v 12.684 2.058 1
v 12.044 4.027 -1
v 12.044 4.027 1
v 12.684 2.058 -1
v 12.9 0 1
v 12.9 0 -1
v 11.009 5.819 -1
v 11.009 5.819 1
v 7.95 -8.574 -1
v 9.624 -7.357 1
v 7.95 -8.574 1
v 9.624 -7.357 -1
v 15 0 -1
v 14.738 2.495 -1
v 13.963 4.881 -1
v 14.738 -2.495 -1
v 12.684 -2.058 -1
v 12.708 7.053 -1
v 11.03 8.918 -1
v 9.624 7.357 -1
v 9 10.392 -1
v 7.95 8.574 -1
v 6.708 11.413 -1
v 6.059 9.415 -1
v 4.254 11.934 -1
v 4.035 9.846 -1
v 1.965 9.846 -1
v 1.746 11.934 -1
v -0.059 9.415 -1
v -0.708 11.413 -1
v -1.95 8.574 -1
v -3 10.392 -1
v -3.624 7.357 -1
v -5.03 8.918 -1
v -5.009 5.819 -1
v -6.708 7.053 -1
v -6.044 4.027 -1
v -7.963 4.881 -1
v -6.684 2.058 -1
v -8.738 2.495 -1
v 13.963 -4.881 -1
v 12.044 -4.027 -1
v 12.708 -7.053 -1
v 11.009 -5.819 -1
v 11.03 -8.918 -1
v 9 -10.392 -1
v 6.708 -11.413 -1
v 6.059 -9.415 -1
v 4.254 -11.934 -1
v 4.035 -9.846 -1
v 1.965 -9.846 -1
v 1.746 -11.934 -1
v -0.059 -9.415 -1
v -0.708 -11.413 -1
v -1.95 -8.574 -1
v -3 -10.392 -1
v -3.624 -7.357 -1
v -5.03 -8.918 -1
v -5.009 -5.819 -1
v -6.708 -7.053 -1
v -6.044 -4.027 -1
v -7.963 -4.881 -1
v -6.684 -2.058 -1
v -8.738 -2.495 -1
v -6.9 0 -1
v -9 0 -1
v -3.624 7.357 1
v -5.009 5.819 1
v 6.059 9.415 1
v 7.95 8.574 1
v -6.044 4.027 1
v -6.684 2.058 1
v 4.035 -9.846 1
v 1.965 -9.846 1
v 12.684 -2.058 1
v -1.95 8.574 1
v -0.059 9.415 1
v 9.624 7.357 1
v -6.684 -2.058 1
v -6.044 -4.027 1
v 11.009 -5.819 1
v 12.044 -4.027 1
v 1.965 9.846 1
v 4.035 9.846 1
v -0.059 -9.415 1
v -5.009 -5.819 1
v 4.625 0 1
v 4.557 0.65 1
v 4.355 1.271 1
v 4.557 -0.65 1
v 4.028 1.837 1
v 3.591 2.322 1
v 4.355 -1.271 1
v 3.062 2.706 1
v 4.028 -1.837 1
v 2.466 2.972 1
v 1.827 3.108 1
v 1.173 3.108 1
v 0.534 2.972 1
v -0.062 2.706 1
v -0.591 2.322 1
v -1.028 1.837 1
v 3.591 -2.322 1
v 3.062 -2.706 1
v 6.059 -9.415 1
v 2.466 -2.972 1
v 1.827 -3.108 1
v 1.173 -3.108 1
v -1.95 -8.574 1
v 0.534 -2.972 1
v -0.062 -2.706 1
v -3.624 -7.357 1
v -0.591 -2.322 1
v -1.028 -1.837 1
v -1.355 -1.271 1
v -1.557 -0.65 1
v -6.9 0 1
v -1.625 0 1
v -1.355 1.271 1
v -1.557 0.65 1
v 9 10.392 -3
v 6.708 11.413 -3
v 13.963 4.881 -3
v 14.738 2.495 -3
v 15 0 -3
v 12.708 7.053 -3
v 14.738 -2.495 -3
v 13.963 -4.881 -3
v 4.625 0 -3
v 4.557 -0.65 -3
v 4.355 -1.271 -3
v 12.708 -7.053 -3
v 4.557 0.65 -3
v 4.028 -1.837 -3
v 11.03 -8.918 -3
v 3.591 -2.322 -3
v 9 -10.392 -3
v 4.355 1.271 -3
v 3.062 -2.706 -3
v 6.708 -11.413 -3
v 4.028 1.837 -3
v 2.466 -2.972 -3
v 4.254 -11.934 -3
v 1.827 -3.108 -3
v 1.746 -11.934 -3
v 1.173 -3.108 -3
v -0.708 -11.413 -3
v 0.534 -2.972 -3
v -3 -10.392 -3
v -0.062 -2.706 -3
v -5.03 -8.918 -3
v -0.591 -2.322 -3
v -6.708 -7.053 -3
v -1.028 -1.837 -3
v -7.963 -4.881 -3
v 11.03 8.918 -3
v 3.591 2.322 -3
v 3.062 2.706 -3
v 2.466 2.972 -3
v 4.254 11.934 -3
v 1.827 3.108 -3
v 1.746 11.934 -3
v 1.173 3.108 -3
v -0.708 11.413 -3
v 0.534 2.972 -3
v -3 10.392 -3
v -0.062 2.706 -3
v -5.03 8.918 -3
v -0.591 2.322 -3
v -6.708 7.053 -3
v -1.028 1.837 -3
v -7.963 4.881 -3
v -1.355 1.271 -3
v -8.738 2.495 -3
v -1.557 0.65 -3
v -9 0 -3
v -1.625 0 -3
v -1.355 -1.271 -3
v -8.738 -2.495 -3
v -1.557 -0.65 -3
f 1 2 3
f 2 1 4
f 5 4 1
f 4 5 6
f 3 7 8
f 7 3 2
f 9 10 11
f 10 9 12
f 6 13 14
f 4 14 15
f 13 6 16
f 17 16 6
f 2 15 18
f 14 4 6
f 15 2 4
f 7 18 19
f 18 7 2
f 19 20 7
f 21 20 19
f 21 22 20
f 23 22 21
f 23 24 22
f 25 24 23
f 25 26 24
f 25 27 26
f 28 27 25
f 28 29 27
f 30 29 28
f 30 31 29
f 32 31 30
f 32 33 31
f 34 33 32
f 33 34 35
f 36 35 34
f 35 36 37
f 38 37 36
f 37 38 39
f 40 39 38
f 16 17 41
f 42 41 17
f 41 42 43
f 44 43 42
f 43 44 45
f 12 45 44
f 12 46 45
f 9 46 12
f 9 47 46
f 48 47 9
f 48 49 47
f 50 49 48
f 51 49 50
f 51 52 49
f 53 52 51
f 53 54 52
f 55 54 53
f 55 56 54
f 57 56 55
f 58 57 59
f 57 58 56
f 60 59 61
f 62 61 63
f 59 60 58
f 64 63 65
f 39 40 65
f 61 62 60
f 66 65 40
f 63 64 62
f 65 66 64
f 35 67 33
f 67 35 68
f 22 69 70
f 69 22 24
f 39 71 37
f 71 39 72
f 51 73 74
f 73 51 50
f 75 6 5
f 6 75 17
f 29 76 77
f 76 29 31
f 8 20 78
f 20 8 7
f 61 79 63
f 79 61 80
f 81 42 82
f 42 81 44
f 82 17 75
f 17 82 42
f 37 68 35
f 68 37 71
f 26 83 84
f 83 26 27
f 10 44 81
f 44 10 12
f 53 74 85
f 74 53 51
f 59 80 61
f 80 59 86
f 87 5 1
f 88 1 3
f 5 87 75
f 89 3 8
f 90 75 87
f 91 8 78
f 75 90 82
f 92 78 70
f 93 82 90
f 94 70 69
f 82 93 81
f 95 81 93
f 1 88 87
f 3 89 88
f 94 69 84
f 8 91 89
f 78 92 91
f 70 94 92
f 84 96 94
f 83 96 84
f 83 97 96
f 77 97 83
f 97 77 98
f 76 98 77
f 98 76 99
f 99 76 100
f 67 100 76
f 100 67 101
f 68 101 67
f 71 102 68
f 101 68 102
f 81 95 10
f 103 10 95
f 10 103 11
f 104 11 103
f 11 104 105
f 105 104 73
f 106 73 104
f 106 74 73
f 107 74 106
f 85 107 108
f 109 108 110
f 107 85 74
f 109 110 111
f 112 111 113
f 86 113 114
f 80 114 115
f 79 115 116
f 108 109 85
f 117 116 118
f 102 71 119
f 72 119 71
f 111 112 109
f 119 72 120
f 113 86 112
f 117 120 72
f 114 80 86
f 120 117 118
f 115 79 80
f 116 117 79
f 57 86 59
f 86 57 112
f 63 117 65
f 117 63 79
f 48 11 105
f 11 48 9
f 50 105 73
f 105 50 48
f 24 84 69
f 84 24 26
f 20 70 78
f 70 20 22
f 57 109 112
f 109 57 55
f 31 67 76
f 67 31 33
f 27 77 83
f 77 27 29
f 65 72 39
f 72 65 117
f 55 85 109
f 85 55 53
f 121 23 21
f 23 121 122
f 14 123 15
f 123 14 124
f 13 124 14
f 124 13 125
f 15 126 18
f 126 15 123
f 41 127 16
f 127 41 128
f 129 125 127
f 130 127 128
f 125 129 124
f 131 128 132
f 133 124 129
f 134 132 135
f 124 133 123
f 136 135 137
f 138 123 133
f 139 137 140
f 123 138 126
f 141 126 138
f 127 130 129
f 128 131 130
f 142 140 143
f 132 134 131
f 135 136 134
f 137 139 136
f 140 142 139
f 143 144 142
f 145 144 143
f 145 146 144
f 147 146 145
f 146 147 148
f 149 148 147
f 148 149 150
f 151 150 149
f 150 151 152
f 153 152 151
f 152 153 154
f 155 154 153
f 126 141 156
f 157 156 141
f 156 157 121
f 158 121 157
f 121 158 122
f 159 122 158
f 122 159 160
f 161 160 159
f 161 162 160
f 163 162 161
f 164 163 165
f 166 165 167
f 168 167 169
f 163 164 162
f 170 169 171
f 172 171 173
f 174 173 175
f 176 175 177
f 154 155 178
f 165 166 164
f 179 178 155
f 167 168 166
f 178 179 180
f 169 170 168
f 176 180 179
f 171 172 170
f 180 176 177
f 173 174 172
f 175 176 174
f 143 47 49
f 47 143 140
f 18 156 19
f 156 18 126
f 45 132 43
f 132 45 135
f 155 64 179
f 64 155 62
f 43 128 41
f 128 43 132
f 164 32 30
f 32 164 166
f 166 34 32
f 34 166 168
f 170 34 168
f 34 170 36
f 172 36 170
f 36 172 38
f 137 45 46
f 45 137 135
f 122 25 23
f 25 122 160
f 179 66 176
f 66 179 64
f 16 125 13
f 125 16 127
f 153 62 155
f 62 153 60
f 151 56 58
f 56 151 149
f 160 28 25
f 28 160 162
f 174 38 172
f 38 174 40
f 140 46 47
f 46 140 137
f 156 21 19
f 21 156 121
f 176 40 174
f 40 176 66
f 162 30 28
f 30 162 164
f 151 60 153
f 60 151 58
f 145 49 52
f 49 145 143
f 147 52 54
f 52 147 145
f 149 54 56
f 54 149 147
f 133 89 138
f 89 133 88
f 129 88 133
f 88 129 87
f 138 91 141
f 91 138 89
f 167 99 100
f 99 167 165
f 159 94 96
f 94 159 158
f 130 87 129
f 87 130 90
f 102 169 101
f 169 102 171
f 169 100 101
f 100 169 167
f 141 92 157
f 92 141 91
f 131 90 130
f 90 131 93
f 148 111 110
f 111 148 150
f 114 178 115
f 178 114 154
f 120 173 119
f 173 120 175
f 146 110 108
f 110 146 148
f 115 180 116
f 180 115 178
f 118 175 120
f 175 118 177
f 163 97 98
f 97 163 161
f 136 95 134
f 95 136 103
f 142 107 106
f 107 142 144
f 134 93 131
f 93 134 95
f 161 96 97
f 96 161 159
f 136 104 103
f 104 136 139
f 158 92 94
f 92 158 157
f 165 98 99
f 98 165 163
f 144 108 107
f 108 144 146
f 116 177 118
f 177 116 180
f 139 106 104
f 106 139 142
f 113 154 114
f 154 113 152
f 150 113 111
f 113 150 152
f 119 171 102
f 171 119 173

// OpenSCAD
$fn = 30;
pi = 3.14159265;

// ===============
// These parameters are for a speed reducer with 
//
// 8 : 1 speed ratio
// 8 inner lobes
// 9 outer lobes
// 4 output cam holes

//n_inner_lobes = 8;
// lobe_diff = 1;
//thickness = 8;
//r_gen = 6;
//r_offset = 10;
//r_pins = 5;
//r_holes = r_pins + lobe_diff*r_gen;
//n_holes = 4;
//r_hole_center = 32;
//r_rotor_shaft = 16;
//r_bolts = 2;
//driven_shaft_od = 50;
//r_drive_shaft = 8;
//square_side = 10;
//alpha =  2*360*$t;

//  ==============

// ===============
// Test 

n_inner_lobes = 30;
 lobe_diff = 1;
thickness = 2;
r_gen = 6/4; //this is the eccentric offset
r_offset = 6/2; //this controls radius of cylinder in shape size
r_pins = 3/2; //the diameter of the pins that go in the holes
//r_holes = r_pins + lobe_diff*r_gen; //(this is the hole size for the pins in the middle of the gear ((currently 6, but want to expand for a bearing)
r_holes = 17.5/2; //606 bearing size to give thhe m6 hole for the pin
n_holes = 4;
r_hole_center = 60/2;

//r_rotor_shaft = 27.25/2; //inside gear 6704 bearing
r_rotor_shaft = 32.4/2; //inside gear 6804 bearing

r_bolts = 6/2;
driven_shaft_od = 40;
r_drive_shaft = 6/2;
square_side = 10;
alpha =  2*360*$t;

clearance_extra = 0.25;

//  ==============


// This part displays the REDUCTION RATIO ======
//
echo(str(n_inner_lobes/lobe_diff, " turns on the input equals 1 turn on the output."));

// This part places the INSIDE ROTOR ==========
//
translate([lobe_diff*r_gen*cos(alpha), lobe_diff* r_gen*sin(alpha), 0])
rotate([0,0,-lobe_diff*alpha/n_inner_lobes])
color([0.5, 0.5, 0.3])
//inside_rotor(n_inner_lobes, 
//				r_gen,
//				0.99*r_offset,
//				r_holes,
//				n_holes,
//				r_hole_center,
//				r_rotor_shaft,
//				thickness, clearance_extra);

// This part places the OUTSIDE ROTOR =========
//color([1, 0, 0])
//outside_rotor(n_inner_lobes + lobe_diff, 
//				r_gen,
//				r_offset,
//				r_bolts,
//				driven_shaft_od,
//				thickness, clearance_extra);

// This part places the DRIVEN SHAFT =========
//
//rotate([0,0,-lobe_diff*alpha/n_inner_lobes])
//color([0,0,1])
//driven_shaft(r_pins, n_holes, r_hole_center, thickness, driven_shaft_od, square_side) ;

// This part places the ECCENTRIC =========
//
//rotate([0,0,alpha])
eccentric(thickness, lobe_diff*r_gen, r_rotor_shaft, r_drive_shaft);

// This part places the COVER PLATE =========
//color([0.2, 0.7, 0.4, 0.6])
//translate([0,0, 1.1*thickness/2 + thickness/4])
//cover_plate(n_inner_lobes + lobe_diff, 
//				r_gen,
//				r_offset,
//				r_bolts,
//				1.02*r_drive_shaft,
//				thickness/2);




//===========================================
// Cover Plate
//
module cover_plate(	n_lobes, 
				r_gen,
				w_gen,
				r_bolts,
				r_shaft,
				thickness) {

difference() {
	cylinder(r = (n_lobes+1)*r_gen + w_gen, h = thickness, center = true);
	cylinder(r = 1.01 * r_shaft, h = 2*thickness, center = true);
	for (i=[0:n_lobes-1]) {
		rotate([0,0,360/n_lobes * (i + 0.5)])
		translate([ (n_lobes+1)*r_gen + w_gen - 4*r_bolts, 0, 0])
			cylinder(r = r_bolts, h = 2*thickness, center = true);
}

}

}
//===========================================	


//===========================================
// Driven Shaft
//
module driven_shaft(r_pins, n_pins, r_pin_center, thickness, driven_shaft_od, square_side) {
translate([0,0,-thickness])
	difference() {
	cylinder(r = driven_shaft_od, h = thickness, center = true);
	cylinder(r = 3.25, h = thickness, center = true);
	
    //cube(size=[square_side, square_side, 1.1*thickness], center = true);
	

//shaft_length = 2;
//translate([0,0, -shaft_length/2 -3*thickness/2])
//	cylinder(r = 1, h = shaft_length, center = true);

    #for  ( i = [0:n_pins-1] ) {
        rotate([0,0,360/n_pins * i])
        translate([r_pin_center,0,0])
            cylinder(r = r_pins, h = thickness, center = true);
    }
    }


}
//===========================================


//===========================================
// Eccentric
//
module eccentric(thickness, ecc, rotor_gear_outer_radius, housing_hole_rad){
difference(){
    translate([ecc, 0, 0])
        //cylinder(r = 0.98 * rotor_gear_outer_radius, h = thickness, center = true);
        union(){
            cylinder(r = 19.8/2, h = thickness, center = true); //6704 or 6804
        
        translate([0,0,-thickness]){         
            cylinder(r = 24/2, h = thickness, center = true); //6704 or 6804
            }
        }
        

    translate([0,0, -thickness/2])
        //cylinder(r = 0.98 * housing_hole_rad, h = thickness, center = true);
        #cylinder(r = 6.25/2, h = thickness*2, center = true);
    }
}
//===========================================


//===========================================
// Inside Rotor
//
module inside_rotor(	n_lobes, 
				r_gen,
				w_gen,
				r_holes,
				n_holes,
				r_hole_center,
				r_shaft,
				thickness, clearance_extra) {
translate([0, 0, -thickness/2])
difference(){
    
    linear_extrude(thickness){
        offset(r = -clearance_extra){
            hypotrochoidBandFast(n_lobes, r_gen, thickness, w_gen);
        }
    }
        // These are the pins
	union() {
		for ( i = [0:n_holes-1] ) {
			rotate([0, 0, i*360/n_holes])
			translate([r_hole_center, 0, 0])
				cylinder(r = r_holes, h = 4*thickness, center = true);
		}	
	}
	cylinder(r = r_shaft, h = 4*thickness, center = true);

}

}
//===========================================			


//===========================================
// Outside Rotor
//
module outside_rotor(	n_lobes, 
				r_gen,
				w_gen,
				r_bolts,
				r_shaft,
				thickness, extra_clearance) {
difference() {
	//cylinder(r = (n_lobes+1)*r_gen + w_gen, h = thickness, center = true);
    cylinder(r = 67.5, h = thickness, center = true);
    translate([60,0,-thickness/2]){
        //cylinder(r=3.25,h=thickness);
    }
    
    translate([-60,0,-thickness/2]){
        //cylinder(r=3.25,h=thickness);
    }
    
    translate([0,60,-thickness/2]){
        //cylinder(r=3.25,h=thickness);
    }
    
    translate([0,-60,-thickness/2]){
        //cylinder(r=3.25,h=thickness);
    }
    translate([0,0,-thickness/2]){
	linear_extrude(thickness){        
            //translate([0, 0, -thickness])
            offset(r = extra_clearance){
                hypotrochoidBandFast(n_lobes, r_gen, 2*thickness, w_gen);
            }
            //lobes
        }
            for (i=[0:n_lobes-1]) {
                rotate([0,0,360/n_lobes * (i + 0.5)])
                translate([ (n_lobes+1)*r_gen + w_gen - 4*r_bolts, 0, 0])
                    cylinder(r = r_bolts, h = 2*thickness, center = true);
                }
            }
        }
    

//    translate([0,0,-thickness]) {
//        difference() {
//            cylinder(r = (n_lobes+1)*r_gen + w_gen, h = thickness, center = true);
//            cylinder(r = 1.01 * r_shaft, h = 2*thickness, center = true);
//            for (i=[0:n_lobes-1]) {
//                rotate([0,0,360/n_lobes * (i + 0.5)])
//                translate([ (n_lobes+1)*r_gen + w_gen - 4*r_bolts, 0, 0])
//                    cylinder(r = r_bolts, h = 2*thickness, center = true);
//        }
//        }
//    }


}
//===========================================	


//===========================================
// Hypotrochoid Band Fast
//
// This generates the normal vector to a hypocycloid, pointing outward,
// and extrudes a profile approximating the envelope of normals.
//
// n 		is the number of lobes
// r		is the radius of the little rolling circle that generates the hypocycloid
// thickness 	is the height of extrusion
// r_off 	is the distance that the envelope is offset from the base hypocycloid
// 
// When r_off = zero the output is the same as a hypocycloid.
//
// As far as I know, OpenSCAD does not do arrays, hence the funny big blocks of
// hardcoded numbers you will see below.
//
module hypotrochoidBandFast(n, r, thickness, r_off) {

	R = r*n;
	d = r;

	// set to 1 for normal size cylinders.  this will leave a tiny cusp in some cases that does
	// not blend in to cylinders.  see below for details.  make hideCuspFactor larger to scale up
	// the cylinders slightly. 1.01 seems to work OK.
	hideCuspFactor = 1.01;

	// dth stands for dtheta - i.e. a small change of the angle "theta"
	// there are 14 intermediate points on the curve, so a wedge is
	// divided into 14 + 1 = 15.  You may be tempted to change this, but it really is 15.
	dth = 360/n/15;

	// X points on base hypotrochoid
	xbStart = (R-r) + d;
	xbEnd =  (R-r)*cos(360/n) + d*cos((R-r)/r*360/n);	

	// Instead of an array and a for-loop we just hard-code these 
	// intermediate points, this if for X coords on the base hypocycloid.
	//
	xb1 = (R-r)*cos(dth*1) + d*cos((R-r)/r*dth*1);
	xb2 = (R-r)*cos(dth*2) + d*cos((R-r)/r*dth*2);
	xb3 = (R-r)*cos(dth*3) + d*cos((R-r)/r*dth*3);
	xb4 = (R-r)*cos(dth*4) + d*cos((R-r)/r*dth*4);
	xb5 = (R-r)*cos(dth*5) + d*cos((R-r)/r*dth*5);
	xb6 = (R-r)*cos(dth*6) + d*cos((R-r)/r*dth*6);
	xb7 = (R-r)*cos(dth*7) + d*cos((R-r)/r*dth*7);	
	xb8 = (R-r)*cos(dth*8) + d*cos((R-r)/r*dth*8);
	xb9 = (R-r)*cos(dth*9) + d*cos((R-r)/r*dth*9);
	xb10 = (R-r)*cos(dth*10) + d*cos((R-r)/r*dth*10);
	xb11 = (R-r)*cos(dth*11) + d*cos((R-r)/r*dth*11);
	xb12 = (R-r)*cos(dth*12) + d*cos((R-r)/r*dth*12);
	xb13 = (R-r)*cos(dth*13) + d*cos((R-r)/r*dth*13);
	xb14 = (R-r)*cos(dth*14) + d*cos((R-r)/r*dth*14);	

	// Y points on base hypotrochoid
	ybStart = 0;
	ybEnd =   (R-r)*sin(360/n) - d*sin((R-r)/r*360/n);

	// Instead of an array and a for-loop we just hard-code these 
	// intermediate points, this if for Y coords on the base hypocycloid.
	//
	yb1 =  (R-r)*sin(dth*1) - d*sin((R-r)/r*dth*1);
	yb2 =  (R-r)*sin(dth*2) - d*sin((R-r)/r*dth*2);
	yb3 =  (R-r)*sin(dth*3) - d*sin((R-r)/r*dth*3);
	yb4 =  (R-r)*sin(dth*4) - d*sin((R-r)/r*dth*4);
	yb5 =  (R-r)*sin(dth*5) - d*sin((R-r)/r*dth*5);
	yb6 =  (R-r)*sin(dth*6) - d*sin((R-r)/r*dth*6);
	yb7 =  (R-r)*sin(dth*7) - d*sin((R-r)/r*dth*7);
	yb8 =  (R-r)*sin(dth*8) - d*sin((R-r)/r*dth*8);
	yb9 =  (R-r)*sin(dth*9) - d*sin((R-r)/r*dth*9);
	yb10 =  (R-r)*sin(dth*10) - d*sin((R-r)/r*dth*10);
	yb11 =  (R-r)*sin(dth*11) - d*sin((R-r)/r*dth*11);
	yb12 =  (R-r)*sin(dth*12) - d*sin((R-r)/r*dth*12);
	yb13 =  (R-r)*sin(dth*13) - d*sin((R-r)/r*dth*13);
	yb14 =  (R-r)*sin(dth*14) - d*sin((R-r)/r*dth*14);

	// Now we do the offset points.  The tangent to the
	// hypotrochoid is [dx/dtheta, dy/dtheta].
	// We take the tangent, normalize it, rotate it, and scale it 
	// to get the offsets in X and Y coords.
	
	// X offset points
	xfStart = 0;
	xfEnd =  r_off*cos(360/n - 90);

	// hard-coded offset points for X
	//
	xf1 = (R-r)*cos(dth*1) - r*cos( (R-r)/r*dth*1) * (R-r)/r ;
	xf2 = (R-r)*cos(dth*2) - r*cos( (R-r)/r*dth*2) * (R-r)/r ;
	xf3 = (R-r)*cos(dth*3) - r*cos( (R-r)/r*dth*3) * (R-r)/r ;
	xf4 = (R-r)*cos(dth*4) - r*cos( (R-r)/r*dth*4) * (R-r)/r ;
	xf5 = (R-r)*cos(dth*5) - r*cos( (R-r)/r*dth*5) * (R-r)/r ;
	xf6 = (R-r)*cos(dth*6) - r*cos( (R-r)/r*dth*6) * (R-r)/r ;
	xf7 = (R-r)*cos(dth*7) - r*cos( (R-r)/r*dth*7) * (R-r)/r ;	
	xf8 = (R-r)*cos(dth*8) - r*cos( (R-r)/r*dth*8) * (R-r)/r ;
	xf9 = (R-r)*cos(dth*9) - r*cos( (R-r)/r*dth*9) * (R-r)/r ;
	xf10 = (R-r)*cos(dth*10) - r*cos( (R-r)/r*dth*10) * (R-r)/r ;
	xf11 = (R-r)*cos(dth*11) - r*cos( (R-r)/r*dth*11) * (R-r)/r ;
	xf12 = (R-r)*cos(dth*12) - r*cos( (R-r)/r*dth*12) * (R-r)/r ;
	xf13 = (R-r)*cos(dth*13) - r*cos( (R-r)/r*dth*13) * (R-r)/r ;
	xf14 = (R-r)*cos(dth*14) - r*cos( (R-r)/r*dth*14) * (R-r)/r ;	

	// Y offset points
	yfStart = r_off;
	yfEnd =  r_off*sin(360/n - 90);

	yf1 =  (R-r)*sin(dth*1) + r*sin( (R-r)/r*dth*1) * (R-r)/r ;
	yf2 =  (R-r)*sin(dth*2) + r*sin( (R-r)/r*dth*2) * (R-r)/r ;
	yf3 =  (R-r)*sin(dth*3) + r*sin( (R-r)/r*dth*3) * (R-r)/r ;
	yf4 =  (R-r)*sin(dth*4) + r*sin( (R-r)/r*dth*4) * (R-r)/r ;
	yf5 =  (R-r)*sin(dth*5) + r*sin( (R-r)/r*dth*5) * (R-r)/r ;
	yf6 =  (R-r)*sin(dth*6) + r*sin( (R-r)/r*dth*6) * (R-r)/r ;
	yf7 =  (R-r)*sin(dth*7) + r*sin( (R-r)/r*dth*7) * (R-r)/r ;
	yf8 =  (R-r)*sin(dth*8) + r*sin( (R-r)/r*dth*8) * (R-r)/r ;
	yf9 =  (R-r)*sin(dth*9) + r*sin( (R-r)/r*dth*9) * (R-r)/r ;
	yf10 =  (R-r)*sin(dth*10) + r*sin( (R-r)/r*dth*10) * (R-r)/r ;
	yf11 =  (R-r)*sin(dth*11) + r*sin( (R-r)/r*dth*11) * (R-r)/r ;
	yf12 =  (R-r)*sin(dth*12) + r*sin( (R-r)/r*dth*12) * (R-r)/r ;
	yf13 =  (R-r)*sin(dth*13) + r*sin( (R-r)/r*dth*13) * (R-r)/r ;
	yf14 =  (R-r)*sin(dth*14) + r*sin( (R-r)/r*dth*14) * (R-r)/r ;

	m1 = sqrt(xf1*xf1 + yf1*yf1)/r_off;
	m2 = sqrt(xf2*xf2 + yf2*yf2)/r_off;
	m3 = sqrt(xf3*xf3 + yf3*yf3)/r_off;
	m4 = sqrt(xf4*xf4 + yf4*yf4)/r_off;
	m5 = sqrt(xf5*xf5 + yf5*yf5)/r_off;
	m6 = sqrt(xf6*xf6 + yf6*yf6)/r_off;
	m7 = sqrt(xf7*xf7 + yf7*yf7)/r_off;
	m8 = sqrt(xf8*xf8 + yf8*yf8)/r_off;
	m9 = sqrt(xf9*xf9 + yf9*yf9)/r_off;
	m10 = sqrt(xf10*xf10 + yf10*yf10)/r_off;
	m11 = sqrt(xf11*xf11 + yf11*yf11)/r_off;
	m12 = sqrt(xf12*xf12 + yf12*yf12)/r_off;
	m13 = sqrt(xf13*xf13 + yf13*yf13)/r_off;
	m14 = sqrt(xf14*xf14 + yf14*yf14)/r_off;

// Now that we have the points, we make a polygon and extrude it.
projection(){	
    union() {
    for  ( i = [0:n-1] ) {
    rotate([0,0, 360/n*i]) {

        linear_extrude(height = thickness)
            // the first point in the polygon is moved slightly off the origin
             polygon(points= [
                [-R/20 * cos(360/n/2) , -R/20 * sin(360/n/2)],
                [xbStart, ybStart],
                [xbStart + xfStart, ybStart + yfStart], 

                [xb1 + xf1/m1, yb1 + yf1/m1], 
                [xb2 + xf2/m2, yb2 + yf2/m2], 
                [xb3 + xf3/m3, yb3 + yf3/m3], 
                [xb4 + xf4/m4, yb4 + yf4/m4], 
                [xb5 + xf5/m5, yb5 + yf5/m5], 
                [xb6 + xf6/m6, yb6 + yf6/m6], 
                [xb7 + xf7/m7, yb7 + yf7/m7], 
                [xb8 + xf8/m8, yb8 + yf8/m8], 
                [xb9 + xf9/m9, yb9 + yf9/m9], 
                [xb10 + xf10/m10, yb10 + yf10/m10], 
                [xb11 + xf11/m11, yb11 + yf11/m11], 
                [xb12 + xf12/m12, yb12 + yf12/m12], 
                [xb13 + xf13/m13, yb13 + yf13/m13], 
                [xb14 + xf14/m14, yb14 + yf14/m14], 

                [xbEnd + xfEnd, ybEnd + yfEnd],
                [xbEnd, ybEnd]],
                paths = [[0,19,18,17,16,15,14,13,12,11,10,9,8,7,6,5,4,3,2,1]],
                convexity = 10);

        // If you look at just the wedge extruded above, without the cylinders below,
        // you can see a small cusp as the band radius gets larger.  The radius of 
        // the cylinder is manually increased a slight bit so that the cusp is contained 
        // within the cylinder.  With unlimited resolution, the cusp and cylinder would
        // blend together perfectly (I think), but this workaround is needed because
        // we are only using piecewise linear approximations to these curves.
        
        translate([xbStart, ybStart, thickness/2])
            cylinder(r = hideCuspFactor*r_off, h = thickness, center = true);
            //circle(r = hideCuspFactor*r_off, center = true);
        
    } //end rotate

    } //end for

    } // end union()
}

} // end module hypotrochoidBandFast
//=========================================== 
